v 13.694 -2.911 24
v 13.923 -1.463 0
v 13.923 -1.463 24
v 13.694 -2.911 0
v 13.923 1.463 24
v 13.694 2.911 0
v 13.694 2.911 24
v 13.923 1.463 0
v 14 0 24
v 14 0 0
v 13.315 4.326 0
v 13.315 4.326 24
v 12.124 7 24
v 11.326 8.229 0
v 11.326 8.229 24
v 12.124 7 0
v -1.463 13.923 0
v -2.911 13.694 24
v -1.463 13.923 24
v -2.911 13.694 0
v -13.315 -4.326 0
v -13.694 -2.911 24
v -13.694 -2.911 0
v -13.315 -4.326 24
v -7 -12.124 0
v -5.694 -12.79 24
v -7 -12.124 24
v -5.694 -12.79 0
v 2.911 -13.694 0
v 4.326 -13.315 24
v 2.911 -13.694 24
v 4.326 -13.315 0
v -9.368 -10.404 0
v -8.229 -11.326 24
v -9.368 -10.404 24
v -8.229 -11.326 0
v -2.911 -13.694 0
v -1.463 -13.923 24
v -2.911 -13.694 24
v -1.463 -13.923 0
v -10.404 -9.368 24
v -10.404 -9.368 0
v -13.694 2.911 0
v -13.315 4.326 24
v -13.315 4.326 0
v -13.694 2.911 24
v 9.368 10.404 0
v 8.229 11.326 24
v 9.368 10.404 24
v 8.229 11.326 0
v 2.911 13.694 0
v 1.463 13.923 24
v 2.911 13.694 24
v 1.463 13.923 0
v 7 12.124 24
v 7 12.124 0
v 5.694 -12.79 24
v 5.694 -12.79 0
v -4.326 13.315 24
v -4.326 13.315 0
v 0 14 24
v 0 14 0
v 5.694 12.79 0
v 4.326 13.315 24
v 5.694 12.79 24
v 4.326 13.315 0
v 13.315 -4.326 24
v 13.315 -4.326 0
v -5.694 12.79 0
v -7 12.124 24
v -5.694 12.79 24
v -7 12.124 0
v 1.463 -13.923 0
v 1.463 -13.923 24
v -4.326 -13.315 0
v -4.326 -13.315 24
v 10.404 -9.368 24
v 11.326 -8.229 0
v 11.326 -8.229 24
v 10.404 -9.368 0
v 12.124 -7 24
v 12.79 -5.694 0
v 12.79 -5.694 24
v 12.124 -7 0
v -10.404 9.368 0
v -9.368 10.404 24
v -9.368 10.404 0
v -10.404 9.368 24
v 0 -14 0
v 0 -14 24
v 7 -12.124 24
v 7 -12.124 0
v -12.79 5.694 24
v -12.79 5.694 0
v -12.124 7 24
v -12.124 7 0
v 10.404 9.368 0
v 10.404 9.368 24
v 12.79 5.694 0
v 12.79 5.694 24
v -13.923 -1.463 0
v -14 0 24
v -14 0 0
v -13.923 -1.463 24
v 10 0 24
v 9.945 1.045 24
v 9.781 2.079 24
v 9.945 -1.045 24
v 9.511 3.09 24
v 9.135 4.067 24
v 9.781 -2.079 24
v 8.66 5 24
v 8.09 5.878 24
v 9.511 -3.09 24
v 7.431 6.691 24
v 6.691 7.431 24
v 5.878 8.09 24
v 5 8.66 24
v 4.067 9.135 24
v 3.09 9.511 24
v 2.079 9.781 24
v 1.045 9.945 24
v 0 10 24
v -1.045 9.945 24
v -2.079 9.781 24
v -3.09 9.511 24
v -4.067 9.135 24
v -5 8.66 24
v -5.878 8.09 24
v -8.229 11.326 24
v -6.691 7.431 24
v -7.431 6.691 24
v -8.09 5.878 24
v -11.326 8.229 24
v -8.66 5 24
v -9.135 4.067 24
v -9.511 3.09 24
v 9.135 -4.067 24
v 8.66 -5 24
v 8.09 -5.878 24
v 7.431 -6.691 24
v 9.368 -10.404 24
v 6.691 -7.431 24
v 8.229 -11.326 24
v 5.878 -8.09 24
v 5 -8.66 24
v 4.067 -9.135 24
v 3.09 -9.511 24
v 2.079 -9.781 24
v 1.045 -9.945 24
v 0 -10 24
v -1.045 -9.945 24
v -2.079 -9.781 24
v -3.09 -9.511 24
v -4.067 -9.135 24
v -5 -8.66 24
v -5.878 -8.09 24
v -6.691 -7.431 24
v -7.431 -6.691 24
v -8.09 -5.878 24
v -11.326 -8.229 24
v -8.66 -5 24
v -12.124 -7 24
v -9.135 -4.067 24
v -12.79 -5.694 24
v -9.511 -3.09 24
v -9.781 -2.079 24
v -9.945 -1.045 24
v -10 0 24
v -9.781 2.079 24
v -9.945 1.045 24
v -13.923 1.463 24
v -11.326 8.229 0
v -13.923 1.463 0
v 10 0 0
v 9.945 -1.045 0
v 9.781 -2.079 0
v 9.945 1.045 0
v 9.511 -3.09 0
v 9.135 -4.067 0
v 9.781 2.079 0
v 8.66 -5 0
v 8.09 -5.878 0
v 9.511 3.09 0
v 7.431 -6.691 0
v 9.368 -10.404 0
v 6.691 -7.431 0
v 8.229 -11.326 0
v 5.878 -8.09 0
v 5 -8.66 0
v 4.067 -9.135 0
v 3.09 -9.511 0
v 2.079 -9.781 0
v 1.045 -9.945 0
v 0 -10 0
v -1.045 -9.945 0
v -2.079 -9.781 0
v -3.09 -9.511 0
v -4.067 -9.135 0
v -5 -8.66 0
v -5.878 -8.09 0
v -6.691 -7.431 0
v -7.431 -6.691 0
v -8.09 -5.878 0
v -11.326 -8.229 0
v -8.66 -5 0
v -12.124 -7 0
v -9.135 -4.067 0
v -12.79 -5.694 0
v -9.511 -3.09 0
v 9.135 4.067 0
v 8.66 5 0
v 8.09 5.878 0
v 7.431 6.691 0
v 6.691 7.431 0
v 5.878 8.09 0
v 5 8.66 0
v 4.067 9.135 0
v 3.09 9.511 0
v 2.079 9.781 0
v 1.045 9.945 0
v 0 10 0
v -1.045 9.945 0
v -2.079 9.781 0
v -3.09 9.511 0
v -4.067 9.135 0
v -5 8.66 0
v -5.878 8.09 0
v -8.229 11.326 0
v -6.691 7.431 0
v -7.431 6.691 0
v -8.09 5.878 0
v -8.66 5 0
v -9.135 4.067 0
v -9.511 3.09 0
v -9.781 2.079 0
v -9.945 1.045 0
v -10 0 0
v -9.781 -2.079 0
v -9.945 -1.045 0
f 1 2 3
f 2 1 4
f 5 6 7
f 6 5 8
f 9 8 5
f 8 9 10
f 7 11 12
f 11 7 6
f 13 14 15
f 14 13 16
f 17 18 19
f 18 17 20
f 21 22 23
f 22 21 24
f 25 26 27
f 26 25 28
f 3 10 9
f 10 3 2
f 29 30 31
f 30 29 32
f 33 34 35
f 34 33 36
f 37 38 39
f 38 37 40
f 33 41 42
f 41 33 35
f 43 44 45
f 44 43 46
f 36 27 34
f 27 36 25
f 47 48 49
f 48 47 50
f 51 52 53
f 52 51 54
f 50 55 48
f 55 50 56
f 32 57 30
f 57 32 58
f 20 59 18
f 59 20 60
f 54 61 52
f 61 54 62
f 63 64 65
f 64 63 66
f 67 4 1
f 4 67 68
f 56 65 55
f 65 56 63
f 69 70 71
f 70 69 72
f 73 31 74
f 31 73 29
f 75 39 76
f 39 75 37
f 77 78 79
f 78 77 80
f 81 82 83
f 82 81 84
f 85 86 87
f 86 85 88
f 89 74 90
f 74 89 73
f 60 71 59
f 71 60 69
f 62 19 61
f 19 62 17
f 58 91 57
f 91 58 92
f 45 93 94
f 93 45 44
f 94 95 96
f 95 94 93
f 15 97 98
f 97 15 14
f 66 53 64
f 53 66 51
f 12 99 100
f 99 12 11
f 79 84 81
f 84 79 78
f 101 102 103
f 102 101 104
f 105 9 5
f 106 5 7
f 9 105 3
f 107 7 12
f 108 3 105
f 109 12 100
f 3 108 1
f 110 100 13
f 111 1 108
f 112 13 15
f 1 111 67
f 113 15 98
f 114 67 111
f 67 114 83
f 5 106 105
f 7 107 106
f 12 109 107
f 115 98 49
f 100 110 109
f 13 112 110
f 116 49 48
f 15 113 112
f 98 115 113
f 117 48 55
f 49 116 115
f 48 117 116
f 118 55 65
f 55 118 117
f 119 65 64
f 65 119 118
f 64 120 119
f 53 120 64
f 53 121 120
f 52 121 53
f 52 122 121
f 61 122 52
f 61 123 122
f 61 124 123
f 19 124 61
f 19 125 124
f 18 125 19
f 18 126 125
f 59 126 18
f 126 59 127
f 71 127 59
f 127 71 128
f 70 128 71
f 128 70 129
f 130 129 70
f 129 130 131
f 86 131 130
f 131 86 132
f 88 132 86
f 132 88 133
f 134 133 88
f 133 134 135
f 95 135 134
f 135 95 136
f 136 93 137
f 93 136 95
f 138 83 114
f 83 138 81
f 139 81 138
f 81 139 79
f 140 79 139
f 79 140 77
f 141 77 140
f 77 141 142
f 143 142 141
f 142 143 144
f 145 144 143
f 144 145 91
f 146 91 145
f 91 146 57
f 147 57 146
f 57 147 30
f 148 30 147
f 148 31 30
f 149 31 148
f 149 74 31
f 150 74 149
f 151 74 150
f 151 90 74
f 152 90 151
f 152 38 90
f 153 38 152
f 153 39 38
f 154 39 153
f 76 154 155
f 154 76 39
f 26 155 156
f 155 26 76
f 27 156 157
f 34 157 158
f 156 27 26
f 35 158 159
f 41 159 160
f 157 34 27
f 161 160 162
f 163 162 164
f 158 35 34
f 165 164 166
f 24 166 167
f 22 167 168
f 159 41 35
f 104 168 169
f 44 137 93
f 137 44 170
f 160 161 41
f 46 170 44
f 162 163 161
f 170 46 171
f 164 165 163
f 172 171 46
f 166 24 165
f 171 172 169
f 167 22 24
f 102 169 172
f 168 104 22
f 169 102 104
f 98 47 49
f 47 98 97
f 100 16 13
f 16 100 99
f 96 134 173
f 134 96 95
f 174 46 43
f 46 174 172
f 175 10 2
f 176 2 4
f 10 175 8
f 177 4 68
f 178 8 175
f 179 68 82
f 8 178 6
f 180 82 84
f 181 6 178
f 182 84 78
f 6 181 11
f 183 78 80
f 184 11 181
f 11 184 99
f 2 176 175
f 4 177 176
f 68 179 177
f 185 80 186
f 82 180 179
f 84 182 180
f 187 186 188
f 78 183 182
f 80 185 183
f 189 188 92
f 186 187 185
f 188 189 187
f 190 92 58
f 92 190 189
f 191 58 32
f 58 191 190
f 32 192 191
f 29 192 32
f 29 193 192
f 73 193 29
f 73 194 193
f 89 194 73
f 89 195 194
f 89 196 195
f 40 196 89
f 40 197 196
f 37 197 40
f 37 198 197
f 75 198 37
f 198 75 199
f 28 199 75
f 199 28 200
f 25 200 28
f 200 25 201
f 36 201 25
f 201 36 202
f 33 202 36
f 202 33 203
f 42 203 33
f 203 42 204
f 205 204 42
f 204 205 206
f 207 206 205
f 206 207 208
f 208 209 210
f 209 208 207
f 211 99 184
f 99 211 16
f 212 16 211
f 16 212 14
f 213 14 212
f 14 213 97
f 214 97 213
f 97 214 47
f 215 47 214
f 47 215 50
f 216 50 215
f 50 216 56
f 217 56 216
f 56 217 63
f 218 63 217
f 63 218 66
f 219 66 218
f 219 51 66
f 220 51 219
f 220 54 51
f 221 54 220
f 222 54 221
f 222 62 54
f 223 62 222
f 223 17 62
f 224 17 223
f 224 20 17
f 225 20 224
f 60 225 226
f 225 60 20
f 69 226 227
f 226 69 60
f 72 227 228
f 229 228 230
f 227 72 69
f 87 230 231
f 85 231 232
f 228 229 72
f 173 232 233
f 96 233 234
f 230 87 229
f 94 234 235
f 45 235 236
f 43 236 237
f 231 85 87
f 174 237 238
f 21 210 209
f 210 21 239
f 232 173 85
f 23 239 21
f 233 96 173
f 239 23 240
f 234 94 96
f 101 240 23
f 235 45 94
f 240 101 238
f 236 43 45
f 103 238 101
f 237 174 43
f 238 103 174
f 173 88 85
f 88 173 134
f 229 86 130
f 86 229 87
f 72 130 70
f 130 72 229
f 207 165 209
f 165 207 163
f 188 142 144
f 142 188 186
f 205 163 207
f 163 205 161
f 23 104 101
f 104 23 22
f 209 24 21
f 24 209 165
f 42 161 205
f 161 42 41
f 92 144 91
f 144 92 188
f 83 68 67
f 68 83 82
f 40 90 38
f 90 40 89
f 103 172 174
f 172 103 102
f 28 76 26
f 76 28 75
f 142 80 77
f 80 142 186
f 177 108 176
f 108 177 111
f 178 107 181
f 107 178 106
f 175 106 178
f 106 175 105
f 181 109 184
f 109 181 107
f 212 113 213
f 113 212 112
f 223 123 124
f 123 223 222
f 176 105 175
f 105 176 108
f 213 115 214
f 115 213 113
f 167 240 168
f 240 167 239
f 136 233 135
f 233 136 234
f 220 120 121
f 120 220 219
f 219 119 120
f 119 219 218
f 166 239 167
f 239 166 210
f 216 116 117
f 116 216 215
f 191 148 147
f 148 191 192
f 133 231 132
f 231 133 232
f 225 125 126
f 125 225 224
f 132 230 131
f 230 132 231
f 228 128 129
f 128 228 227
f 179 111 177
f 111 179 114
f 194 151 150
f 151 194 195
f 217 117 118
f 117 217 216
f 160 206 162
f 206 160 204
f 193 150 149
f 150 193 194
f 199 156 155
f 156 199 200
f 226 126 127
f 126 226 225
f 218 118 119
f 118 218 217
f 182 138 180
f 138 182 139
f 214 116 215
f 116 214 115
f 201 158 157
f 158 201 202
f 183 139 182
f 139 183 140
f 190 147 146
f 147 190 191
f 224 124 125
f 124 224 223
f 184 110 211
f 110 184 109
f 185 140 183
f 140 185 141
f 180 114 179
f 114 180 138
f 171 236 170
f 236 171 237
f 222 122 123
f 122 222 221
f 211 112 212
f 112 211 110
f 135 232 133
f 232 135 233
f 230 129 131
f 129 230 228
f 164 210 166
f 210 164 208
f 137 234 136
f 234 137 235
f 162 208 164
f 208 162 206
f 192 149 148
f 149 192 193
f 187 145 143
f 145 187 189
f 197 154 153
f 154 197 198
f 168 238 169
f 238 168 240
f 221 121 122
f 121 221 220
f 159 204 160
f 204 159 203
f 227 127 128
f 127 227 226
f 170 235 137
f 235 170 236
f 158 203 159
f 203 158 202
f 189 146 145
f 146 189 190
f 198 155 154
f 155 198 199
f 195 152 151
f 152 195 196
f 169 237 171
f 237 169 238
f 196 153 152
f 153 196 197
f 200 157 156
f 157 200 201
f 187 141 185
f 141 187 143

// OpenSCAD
// Axle spacer tube.
$fn = 60;
eps = 0.02;
inner_d = 20;
outer_d = 28;
length = 24;
difference() { cylinder(d = outer_d, h = length); translate([0,0,-eps]) cylinder(d = inner_d, h = length + 2 * eps); }
